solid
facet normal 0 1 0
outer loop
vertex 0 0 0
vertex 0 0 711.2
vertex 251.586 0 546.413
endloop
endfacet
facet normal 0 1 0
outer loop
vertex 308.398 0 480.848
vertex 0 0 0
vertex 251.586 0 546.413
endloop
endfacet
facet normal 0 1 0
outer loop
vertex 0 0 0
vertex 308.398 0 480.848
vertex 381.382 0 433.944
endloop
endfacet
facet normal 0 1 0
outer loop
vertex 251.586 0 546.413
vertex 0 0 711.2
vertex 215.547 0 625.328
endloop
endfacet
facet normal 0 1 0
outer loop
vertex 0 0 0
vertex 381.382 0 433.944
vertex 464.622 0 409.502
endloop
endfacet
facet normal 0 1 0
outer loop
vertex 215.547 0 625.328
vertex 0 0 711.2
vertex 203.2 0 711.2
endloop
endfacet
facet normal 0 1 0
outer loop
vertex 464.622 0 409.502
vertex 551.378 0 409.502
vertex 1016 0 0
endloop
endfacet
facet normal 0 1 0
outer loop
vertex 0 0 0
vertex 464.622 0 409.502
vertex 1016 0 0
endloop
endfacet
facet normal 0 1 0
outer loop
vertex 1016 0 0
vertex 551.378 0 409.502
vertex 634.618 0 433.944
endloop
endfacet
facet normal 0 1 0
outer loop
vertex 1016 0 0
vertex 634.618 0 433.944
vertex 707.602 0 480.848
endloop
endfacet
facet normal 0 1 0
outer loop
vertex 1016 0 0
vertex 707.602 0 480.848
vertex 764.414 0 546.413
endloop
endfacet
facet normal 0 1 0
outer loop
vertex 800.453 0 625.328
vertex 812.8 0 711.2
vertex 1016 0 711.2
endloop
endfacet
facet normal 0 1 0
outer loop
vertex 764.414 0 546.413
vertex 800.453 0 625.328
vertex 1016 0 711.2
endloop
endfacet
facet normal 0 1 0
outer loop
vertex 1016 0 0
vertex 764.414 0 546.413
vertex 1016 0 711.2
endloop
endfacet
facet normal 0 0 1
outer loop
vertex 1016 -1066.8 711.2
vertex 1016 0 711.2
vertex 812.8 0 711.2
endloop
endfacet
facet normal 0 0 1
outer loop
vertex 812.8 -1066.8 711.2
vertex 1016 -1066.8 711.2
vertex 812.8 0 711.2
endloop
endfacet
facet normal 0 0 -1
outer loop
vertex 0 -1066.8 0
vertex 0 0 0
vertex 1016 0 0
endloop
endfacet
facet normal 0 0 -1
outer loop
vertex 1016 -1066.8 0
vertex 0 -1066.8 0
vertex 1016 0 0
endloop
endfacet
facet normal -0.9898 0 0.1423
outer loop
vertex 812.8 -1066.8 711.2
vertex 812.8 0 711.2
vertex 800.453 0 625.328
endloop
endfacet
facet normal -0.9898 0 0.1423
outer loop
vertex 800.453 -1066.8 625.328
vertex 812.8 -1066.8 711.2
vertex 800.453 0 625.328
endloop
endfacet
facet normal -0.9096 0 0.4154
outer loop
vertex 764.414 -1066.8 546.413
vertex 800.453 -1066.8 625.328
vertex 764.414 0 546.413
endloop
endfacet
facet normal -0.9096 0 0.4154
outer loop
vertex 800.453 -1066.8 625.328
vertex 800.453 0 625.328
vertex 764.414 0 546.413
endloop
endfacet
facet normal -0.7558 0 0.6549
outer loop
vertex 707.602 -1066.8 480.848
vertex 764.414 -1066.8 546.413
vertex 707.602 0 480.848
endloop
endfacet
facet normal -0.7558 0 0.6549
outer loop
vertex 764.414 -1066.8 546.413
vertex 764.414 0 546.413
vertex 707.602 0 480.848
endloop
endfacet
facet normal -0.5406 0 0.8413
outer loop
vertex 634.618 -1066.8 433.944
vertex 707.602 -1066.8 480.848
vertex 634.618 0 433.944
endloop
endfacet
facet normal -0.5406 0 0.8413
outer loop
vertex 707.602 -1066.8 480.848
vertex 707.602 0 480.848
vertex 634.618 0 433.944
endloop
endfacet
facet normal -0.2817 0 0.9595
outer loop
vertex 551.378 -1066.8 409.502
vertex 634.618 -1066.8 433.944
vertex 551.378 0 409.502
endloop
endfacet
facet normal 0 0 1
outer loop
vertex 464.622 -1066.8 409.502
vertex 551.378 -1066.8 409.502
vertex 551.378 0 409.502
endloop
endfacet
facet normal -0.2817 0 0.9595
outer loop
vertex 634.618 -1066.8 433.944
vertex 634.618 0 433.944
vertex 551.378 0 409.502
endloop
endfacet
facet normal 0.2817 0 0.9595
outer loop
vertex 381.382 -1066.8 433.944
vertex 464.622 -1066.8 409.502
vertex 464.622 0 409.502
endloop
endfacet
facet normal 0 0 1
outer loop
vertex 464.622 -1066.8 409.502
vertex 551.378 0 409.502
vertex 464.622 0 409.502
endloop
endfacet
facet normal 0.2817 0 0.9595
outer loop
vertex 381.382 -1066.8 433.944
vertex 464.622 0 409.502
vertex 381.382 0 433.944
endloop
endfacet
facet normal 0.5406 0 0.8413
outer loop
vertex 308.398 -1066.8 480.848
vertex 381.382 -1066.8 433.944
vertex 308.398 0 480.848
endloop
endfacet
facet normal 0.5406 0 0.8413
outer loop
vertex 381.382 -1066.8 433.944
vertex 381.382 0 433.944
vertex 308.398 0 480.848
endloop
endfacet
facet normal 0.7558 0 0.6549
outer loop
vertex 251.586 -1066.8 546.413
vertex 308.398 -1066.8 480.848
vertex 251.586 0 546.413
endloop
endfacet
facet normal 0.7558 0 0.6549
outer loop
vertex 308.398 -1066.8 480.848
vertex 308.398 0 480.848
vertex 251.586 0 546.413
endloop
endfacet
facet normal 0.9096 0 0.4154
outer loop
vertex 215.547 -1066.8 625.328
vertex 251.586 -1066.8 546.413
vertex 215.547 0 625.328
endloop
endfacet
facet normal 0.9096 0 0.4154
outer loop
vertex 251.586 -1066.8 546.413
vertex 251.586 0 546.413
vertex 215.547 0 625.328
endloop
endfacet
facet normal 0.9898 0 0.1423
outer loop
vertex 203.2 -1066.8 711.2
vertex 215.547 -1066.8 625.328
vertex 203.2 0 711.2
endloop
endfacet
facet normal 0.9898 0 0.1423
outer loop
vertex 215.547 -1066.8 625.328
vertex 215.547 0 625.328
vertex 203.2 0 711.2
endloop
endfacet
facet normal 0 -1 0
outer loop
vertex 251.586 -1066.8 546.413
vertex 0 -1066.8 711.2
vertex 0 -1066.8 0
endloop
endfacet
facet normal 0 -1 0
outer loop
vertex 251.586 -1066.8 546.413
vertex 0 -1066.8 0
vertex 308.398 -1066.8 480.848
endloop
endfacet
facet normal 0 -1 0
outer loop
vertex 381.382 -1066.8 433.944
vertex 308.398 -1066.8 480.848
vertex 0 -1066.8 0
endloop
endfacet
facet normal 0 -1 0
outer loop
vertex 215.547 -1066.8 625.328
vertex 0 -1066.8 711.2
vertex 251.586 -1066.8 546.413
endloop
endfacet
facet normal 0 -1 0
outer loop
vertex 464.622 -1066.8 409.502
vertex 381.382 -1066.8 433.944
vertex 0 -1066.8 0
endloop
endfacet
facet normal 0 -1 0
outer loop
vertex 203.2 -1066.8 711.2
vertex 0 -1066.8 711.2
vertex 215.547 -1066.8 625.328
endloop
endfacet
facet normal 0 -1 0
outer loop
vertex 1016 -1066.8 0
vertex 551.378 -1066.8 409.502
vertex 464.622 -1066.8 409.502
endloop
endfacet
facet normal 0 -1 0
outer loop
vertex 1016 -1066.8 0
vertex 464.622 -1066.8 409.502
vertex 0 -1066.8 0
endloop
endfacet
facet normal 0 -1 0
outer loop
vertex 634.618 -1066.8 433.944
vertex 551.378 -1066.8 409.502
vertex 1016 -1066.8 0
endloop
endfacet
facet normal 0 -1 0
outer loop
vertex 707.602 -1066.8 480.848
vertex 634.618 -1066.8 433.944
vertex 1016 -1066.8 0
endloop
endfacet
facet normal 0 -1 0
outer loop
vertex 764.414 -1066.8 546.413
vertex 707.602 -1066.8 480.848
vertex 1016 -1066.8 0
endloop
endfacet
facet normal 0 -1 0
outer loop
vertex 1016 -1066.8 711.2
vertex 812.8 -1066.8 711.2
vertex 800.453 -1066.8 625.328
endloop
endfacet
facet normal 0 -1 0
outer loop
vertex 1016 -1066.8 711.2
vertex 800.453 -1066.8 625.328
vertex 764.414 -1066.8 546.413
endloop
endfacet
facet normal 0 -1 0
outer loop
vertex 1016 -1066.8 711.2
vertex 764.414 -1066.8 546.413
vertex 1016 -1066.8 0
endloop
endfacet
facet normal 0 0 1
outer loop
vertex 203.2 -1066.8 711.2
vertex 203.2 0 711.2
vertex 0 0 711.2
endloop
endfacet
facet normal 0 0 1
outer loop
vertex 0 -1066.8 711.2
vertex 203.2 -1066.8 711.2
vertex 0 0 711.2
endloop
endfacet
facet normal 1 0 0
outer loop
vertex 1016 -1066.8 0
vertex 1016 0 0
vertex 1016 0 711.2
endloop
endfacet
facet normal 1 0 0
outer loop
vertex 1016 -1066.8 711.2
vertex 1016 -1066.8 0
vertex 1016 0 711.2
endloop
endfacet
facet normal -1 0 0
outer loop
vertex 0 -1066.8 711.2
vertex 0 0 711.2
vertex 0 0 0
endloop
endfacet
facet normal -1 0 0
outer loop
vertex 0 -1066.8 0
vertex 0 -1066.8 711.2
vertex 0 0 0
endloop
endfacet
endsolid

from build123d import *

# Parameters (mm, degrees)
F1_DEPTH = 1066.8


with BuildPart() as f1:
    # F0 (on Front) → F1 (new body)
    with BuildSketch(Plane.XZ):
        with BuildLine():
            Line((0, 711.2), (0, 0))
            Line((0, 0), (1016, 0))
            Line((1016, 0), (1016, 711.2))
            Line((1016, 711.2), (812.8, 711.2))
            ThreePointArc((812.8, 711.2), (508, 406.4), (203.2, 711.2))
            Line((203.2, 711.2), (0, 711.2))
        make_face()
    extrude(amount=F1_DEPTH)


solid = f1.part
